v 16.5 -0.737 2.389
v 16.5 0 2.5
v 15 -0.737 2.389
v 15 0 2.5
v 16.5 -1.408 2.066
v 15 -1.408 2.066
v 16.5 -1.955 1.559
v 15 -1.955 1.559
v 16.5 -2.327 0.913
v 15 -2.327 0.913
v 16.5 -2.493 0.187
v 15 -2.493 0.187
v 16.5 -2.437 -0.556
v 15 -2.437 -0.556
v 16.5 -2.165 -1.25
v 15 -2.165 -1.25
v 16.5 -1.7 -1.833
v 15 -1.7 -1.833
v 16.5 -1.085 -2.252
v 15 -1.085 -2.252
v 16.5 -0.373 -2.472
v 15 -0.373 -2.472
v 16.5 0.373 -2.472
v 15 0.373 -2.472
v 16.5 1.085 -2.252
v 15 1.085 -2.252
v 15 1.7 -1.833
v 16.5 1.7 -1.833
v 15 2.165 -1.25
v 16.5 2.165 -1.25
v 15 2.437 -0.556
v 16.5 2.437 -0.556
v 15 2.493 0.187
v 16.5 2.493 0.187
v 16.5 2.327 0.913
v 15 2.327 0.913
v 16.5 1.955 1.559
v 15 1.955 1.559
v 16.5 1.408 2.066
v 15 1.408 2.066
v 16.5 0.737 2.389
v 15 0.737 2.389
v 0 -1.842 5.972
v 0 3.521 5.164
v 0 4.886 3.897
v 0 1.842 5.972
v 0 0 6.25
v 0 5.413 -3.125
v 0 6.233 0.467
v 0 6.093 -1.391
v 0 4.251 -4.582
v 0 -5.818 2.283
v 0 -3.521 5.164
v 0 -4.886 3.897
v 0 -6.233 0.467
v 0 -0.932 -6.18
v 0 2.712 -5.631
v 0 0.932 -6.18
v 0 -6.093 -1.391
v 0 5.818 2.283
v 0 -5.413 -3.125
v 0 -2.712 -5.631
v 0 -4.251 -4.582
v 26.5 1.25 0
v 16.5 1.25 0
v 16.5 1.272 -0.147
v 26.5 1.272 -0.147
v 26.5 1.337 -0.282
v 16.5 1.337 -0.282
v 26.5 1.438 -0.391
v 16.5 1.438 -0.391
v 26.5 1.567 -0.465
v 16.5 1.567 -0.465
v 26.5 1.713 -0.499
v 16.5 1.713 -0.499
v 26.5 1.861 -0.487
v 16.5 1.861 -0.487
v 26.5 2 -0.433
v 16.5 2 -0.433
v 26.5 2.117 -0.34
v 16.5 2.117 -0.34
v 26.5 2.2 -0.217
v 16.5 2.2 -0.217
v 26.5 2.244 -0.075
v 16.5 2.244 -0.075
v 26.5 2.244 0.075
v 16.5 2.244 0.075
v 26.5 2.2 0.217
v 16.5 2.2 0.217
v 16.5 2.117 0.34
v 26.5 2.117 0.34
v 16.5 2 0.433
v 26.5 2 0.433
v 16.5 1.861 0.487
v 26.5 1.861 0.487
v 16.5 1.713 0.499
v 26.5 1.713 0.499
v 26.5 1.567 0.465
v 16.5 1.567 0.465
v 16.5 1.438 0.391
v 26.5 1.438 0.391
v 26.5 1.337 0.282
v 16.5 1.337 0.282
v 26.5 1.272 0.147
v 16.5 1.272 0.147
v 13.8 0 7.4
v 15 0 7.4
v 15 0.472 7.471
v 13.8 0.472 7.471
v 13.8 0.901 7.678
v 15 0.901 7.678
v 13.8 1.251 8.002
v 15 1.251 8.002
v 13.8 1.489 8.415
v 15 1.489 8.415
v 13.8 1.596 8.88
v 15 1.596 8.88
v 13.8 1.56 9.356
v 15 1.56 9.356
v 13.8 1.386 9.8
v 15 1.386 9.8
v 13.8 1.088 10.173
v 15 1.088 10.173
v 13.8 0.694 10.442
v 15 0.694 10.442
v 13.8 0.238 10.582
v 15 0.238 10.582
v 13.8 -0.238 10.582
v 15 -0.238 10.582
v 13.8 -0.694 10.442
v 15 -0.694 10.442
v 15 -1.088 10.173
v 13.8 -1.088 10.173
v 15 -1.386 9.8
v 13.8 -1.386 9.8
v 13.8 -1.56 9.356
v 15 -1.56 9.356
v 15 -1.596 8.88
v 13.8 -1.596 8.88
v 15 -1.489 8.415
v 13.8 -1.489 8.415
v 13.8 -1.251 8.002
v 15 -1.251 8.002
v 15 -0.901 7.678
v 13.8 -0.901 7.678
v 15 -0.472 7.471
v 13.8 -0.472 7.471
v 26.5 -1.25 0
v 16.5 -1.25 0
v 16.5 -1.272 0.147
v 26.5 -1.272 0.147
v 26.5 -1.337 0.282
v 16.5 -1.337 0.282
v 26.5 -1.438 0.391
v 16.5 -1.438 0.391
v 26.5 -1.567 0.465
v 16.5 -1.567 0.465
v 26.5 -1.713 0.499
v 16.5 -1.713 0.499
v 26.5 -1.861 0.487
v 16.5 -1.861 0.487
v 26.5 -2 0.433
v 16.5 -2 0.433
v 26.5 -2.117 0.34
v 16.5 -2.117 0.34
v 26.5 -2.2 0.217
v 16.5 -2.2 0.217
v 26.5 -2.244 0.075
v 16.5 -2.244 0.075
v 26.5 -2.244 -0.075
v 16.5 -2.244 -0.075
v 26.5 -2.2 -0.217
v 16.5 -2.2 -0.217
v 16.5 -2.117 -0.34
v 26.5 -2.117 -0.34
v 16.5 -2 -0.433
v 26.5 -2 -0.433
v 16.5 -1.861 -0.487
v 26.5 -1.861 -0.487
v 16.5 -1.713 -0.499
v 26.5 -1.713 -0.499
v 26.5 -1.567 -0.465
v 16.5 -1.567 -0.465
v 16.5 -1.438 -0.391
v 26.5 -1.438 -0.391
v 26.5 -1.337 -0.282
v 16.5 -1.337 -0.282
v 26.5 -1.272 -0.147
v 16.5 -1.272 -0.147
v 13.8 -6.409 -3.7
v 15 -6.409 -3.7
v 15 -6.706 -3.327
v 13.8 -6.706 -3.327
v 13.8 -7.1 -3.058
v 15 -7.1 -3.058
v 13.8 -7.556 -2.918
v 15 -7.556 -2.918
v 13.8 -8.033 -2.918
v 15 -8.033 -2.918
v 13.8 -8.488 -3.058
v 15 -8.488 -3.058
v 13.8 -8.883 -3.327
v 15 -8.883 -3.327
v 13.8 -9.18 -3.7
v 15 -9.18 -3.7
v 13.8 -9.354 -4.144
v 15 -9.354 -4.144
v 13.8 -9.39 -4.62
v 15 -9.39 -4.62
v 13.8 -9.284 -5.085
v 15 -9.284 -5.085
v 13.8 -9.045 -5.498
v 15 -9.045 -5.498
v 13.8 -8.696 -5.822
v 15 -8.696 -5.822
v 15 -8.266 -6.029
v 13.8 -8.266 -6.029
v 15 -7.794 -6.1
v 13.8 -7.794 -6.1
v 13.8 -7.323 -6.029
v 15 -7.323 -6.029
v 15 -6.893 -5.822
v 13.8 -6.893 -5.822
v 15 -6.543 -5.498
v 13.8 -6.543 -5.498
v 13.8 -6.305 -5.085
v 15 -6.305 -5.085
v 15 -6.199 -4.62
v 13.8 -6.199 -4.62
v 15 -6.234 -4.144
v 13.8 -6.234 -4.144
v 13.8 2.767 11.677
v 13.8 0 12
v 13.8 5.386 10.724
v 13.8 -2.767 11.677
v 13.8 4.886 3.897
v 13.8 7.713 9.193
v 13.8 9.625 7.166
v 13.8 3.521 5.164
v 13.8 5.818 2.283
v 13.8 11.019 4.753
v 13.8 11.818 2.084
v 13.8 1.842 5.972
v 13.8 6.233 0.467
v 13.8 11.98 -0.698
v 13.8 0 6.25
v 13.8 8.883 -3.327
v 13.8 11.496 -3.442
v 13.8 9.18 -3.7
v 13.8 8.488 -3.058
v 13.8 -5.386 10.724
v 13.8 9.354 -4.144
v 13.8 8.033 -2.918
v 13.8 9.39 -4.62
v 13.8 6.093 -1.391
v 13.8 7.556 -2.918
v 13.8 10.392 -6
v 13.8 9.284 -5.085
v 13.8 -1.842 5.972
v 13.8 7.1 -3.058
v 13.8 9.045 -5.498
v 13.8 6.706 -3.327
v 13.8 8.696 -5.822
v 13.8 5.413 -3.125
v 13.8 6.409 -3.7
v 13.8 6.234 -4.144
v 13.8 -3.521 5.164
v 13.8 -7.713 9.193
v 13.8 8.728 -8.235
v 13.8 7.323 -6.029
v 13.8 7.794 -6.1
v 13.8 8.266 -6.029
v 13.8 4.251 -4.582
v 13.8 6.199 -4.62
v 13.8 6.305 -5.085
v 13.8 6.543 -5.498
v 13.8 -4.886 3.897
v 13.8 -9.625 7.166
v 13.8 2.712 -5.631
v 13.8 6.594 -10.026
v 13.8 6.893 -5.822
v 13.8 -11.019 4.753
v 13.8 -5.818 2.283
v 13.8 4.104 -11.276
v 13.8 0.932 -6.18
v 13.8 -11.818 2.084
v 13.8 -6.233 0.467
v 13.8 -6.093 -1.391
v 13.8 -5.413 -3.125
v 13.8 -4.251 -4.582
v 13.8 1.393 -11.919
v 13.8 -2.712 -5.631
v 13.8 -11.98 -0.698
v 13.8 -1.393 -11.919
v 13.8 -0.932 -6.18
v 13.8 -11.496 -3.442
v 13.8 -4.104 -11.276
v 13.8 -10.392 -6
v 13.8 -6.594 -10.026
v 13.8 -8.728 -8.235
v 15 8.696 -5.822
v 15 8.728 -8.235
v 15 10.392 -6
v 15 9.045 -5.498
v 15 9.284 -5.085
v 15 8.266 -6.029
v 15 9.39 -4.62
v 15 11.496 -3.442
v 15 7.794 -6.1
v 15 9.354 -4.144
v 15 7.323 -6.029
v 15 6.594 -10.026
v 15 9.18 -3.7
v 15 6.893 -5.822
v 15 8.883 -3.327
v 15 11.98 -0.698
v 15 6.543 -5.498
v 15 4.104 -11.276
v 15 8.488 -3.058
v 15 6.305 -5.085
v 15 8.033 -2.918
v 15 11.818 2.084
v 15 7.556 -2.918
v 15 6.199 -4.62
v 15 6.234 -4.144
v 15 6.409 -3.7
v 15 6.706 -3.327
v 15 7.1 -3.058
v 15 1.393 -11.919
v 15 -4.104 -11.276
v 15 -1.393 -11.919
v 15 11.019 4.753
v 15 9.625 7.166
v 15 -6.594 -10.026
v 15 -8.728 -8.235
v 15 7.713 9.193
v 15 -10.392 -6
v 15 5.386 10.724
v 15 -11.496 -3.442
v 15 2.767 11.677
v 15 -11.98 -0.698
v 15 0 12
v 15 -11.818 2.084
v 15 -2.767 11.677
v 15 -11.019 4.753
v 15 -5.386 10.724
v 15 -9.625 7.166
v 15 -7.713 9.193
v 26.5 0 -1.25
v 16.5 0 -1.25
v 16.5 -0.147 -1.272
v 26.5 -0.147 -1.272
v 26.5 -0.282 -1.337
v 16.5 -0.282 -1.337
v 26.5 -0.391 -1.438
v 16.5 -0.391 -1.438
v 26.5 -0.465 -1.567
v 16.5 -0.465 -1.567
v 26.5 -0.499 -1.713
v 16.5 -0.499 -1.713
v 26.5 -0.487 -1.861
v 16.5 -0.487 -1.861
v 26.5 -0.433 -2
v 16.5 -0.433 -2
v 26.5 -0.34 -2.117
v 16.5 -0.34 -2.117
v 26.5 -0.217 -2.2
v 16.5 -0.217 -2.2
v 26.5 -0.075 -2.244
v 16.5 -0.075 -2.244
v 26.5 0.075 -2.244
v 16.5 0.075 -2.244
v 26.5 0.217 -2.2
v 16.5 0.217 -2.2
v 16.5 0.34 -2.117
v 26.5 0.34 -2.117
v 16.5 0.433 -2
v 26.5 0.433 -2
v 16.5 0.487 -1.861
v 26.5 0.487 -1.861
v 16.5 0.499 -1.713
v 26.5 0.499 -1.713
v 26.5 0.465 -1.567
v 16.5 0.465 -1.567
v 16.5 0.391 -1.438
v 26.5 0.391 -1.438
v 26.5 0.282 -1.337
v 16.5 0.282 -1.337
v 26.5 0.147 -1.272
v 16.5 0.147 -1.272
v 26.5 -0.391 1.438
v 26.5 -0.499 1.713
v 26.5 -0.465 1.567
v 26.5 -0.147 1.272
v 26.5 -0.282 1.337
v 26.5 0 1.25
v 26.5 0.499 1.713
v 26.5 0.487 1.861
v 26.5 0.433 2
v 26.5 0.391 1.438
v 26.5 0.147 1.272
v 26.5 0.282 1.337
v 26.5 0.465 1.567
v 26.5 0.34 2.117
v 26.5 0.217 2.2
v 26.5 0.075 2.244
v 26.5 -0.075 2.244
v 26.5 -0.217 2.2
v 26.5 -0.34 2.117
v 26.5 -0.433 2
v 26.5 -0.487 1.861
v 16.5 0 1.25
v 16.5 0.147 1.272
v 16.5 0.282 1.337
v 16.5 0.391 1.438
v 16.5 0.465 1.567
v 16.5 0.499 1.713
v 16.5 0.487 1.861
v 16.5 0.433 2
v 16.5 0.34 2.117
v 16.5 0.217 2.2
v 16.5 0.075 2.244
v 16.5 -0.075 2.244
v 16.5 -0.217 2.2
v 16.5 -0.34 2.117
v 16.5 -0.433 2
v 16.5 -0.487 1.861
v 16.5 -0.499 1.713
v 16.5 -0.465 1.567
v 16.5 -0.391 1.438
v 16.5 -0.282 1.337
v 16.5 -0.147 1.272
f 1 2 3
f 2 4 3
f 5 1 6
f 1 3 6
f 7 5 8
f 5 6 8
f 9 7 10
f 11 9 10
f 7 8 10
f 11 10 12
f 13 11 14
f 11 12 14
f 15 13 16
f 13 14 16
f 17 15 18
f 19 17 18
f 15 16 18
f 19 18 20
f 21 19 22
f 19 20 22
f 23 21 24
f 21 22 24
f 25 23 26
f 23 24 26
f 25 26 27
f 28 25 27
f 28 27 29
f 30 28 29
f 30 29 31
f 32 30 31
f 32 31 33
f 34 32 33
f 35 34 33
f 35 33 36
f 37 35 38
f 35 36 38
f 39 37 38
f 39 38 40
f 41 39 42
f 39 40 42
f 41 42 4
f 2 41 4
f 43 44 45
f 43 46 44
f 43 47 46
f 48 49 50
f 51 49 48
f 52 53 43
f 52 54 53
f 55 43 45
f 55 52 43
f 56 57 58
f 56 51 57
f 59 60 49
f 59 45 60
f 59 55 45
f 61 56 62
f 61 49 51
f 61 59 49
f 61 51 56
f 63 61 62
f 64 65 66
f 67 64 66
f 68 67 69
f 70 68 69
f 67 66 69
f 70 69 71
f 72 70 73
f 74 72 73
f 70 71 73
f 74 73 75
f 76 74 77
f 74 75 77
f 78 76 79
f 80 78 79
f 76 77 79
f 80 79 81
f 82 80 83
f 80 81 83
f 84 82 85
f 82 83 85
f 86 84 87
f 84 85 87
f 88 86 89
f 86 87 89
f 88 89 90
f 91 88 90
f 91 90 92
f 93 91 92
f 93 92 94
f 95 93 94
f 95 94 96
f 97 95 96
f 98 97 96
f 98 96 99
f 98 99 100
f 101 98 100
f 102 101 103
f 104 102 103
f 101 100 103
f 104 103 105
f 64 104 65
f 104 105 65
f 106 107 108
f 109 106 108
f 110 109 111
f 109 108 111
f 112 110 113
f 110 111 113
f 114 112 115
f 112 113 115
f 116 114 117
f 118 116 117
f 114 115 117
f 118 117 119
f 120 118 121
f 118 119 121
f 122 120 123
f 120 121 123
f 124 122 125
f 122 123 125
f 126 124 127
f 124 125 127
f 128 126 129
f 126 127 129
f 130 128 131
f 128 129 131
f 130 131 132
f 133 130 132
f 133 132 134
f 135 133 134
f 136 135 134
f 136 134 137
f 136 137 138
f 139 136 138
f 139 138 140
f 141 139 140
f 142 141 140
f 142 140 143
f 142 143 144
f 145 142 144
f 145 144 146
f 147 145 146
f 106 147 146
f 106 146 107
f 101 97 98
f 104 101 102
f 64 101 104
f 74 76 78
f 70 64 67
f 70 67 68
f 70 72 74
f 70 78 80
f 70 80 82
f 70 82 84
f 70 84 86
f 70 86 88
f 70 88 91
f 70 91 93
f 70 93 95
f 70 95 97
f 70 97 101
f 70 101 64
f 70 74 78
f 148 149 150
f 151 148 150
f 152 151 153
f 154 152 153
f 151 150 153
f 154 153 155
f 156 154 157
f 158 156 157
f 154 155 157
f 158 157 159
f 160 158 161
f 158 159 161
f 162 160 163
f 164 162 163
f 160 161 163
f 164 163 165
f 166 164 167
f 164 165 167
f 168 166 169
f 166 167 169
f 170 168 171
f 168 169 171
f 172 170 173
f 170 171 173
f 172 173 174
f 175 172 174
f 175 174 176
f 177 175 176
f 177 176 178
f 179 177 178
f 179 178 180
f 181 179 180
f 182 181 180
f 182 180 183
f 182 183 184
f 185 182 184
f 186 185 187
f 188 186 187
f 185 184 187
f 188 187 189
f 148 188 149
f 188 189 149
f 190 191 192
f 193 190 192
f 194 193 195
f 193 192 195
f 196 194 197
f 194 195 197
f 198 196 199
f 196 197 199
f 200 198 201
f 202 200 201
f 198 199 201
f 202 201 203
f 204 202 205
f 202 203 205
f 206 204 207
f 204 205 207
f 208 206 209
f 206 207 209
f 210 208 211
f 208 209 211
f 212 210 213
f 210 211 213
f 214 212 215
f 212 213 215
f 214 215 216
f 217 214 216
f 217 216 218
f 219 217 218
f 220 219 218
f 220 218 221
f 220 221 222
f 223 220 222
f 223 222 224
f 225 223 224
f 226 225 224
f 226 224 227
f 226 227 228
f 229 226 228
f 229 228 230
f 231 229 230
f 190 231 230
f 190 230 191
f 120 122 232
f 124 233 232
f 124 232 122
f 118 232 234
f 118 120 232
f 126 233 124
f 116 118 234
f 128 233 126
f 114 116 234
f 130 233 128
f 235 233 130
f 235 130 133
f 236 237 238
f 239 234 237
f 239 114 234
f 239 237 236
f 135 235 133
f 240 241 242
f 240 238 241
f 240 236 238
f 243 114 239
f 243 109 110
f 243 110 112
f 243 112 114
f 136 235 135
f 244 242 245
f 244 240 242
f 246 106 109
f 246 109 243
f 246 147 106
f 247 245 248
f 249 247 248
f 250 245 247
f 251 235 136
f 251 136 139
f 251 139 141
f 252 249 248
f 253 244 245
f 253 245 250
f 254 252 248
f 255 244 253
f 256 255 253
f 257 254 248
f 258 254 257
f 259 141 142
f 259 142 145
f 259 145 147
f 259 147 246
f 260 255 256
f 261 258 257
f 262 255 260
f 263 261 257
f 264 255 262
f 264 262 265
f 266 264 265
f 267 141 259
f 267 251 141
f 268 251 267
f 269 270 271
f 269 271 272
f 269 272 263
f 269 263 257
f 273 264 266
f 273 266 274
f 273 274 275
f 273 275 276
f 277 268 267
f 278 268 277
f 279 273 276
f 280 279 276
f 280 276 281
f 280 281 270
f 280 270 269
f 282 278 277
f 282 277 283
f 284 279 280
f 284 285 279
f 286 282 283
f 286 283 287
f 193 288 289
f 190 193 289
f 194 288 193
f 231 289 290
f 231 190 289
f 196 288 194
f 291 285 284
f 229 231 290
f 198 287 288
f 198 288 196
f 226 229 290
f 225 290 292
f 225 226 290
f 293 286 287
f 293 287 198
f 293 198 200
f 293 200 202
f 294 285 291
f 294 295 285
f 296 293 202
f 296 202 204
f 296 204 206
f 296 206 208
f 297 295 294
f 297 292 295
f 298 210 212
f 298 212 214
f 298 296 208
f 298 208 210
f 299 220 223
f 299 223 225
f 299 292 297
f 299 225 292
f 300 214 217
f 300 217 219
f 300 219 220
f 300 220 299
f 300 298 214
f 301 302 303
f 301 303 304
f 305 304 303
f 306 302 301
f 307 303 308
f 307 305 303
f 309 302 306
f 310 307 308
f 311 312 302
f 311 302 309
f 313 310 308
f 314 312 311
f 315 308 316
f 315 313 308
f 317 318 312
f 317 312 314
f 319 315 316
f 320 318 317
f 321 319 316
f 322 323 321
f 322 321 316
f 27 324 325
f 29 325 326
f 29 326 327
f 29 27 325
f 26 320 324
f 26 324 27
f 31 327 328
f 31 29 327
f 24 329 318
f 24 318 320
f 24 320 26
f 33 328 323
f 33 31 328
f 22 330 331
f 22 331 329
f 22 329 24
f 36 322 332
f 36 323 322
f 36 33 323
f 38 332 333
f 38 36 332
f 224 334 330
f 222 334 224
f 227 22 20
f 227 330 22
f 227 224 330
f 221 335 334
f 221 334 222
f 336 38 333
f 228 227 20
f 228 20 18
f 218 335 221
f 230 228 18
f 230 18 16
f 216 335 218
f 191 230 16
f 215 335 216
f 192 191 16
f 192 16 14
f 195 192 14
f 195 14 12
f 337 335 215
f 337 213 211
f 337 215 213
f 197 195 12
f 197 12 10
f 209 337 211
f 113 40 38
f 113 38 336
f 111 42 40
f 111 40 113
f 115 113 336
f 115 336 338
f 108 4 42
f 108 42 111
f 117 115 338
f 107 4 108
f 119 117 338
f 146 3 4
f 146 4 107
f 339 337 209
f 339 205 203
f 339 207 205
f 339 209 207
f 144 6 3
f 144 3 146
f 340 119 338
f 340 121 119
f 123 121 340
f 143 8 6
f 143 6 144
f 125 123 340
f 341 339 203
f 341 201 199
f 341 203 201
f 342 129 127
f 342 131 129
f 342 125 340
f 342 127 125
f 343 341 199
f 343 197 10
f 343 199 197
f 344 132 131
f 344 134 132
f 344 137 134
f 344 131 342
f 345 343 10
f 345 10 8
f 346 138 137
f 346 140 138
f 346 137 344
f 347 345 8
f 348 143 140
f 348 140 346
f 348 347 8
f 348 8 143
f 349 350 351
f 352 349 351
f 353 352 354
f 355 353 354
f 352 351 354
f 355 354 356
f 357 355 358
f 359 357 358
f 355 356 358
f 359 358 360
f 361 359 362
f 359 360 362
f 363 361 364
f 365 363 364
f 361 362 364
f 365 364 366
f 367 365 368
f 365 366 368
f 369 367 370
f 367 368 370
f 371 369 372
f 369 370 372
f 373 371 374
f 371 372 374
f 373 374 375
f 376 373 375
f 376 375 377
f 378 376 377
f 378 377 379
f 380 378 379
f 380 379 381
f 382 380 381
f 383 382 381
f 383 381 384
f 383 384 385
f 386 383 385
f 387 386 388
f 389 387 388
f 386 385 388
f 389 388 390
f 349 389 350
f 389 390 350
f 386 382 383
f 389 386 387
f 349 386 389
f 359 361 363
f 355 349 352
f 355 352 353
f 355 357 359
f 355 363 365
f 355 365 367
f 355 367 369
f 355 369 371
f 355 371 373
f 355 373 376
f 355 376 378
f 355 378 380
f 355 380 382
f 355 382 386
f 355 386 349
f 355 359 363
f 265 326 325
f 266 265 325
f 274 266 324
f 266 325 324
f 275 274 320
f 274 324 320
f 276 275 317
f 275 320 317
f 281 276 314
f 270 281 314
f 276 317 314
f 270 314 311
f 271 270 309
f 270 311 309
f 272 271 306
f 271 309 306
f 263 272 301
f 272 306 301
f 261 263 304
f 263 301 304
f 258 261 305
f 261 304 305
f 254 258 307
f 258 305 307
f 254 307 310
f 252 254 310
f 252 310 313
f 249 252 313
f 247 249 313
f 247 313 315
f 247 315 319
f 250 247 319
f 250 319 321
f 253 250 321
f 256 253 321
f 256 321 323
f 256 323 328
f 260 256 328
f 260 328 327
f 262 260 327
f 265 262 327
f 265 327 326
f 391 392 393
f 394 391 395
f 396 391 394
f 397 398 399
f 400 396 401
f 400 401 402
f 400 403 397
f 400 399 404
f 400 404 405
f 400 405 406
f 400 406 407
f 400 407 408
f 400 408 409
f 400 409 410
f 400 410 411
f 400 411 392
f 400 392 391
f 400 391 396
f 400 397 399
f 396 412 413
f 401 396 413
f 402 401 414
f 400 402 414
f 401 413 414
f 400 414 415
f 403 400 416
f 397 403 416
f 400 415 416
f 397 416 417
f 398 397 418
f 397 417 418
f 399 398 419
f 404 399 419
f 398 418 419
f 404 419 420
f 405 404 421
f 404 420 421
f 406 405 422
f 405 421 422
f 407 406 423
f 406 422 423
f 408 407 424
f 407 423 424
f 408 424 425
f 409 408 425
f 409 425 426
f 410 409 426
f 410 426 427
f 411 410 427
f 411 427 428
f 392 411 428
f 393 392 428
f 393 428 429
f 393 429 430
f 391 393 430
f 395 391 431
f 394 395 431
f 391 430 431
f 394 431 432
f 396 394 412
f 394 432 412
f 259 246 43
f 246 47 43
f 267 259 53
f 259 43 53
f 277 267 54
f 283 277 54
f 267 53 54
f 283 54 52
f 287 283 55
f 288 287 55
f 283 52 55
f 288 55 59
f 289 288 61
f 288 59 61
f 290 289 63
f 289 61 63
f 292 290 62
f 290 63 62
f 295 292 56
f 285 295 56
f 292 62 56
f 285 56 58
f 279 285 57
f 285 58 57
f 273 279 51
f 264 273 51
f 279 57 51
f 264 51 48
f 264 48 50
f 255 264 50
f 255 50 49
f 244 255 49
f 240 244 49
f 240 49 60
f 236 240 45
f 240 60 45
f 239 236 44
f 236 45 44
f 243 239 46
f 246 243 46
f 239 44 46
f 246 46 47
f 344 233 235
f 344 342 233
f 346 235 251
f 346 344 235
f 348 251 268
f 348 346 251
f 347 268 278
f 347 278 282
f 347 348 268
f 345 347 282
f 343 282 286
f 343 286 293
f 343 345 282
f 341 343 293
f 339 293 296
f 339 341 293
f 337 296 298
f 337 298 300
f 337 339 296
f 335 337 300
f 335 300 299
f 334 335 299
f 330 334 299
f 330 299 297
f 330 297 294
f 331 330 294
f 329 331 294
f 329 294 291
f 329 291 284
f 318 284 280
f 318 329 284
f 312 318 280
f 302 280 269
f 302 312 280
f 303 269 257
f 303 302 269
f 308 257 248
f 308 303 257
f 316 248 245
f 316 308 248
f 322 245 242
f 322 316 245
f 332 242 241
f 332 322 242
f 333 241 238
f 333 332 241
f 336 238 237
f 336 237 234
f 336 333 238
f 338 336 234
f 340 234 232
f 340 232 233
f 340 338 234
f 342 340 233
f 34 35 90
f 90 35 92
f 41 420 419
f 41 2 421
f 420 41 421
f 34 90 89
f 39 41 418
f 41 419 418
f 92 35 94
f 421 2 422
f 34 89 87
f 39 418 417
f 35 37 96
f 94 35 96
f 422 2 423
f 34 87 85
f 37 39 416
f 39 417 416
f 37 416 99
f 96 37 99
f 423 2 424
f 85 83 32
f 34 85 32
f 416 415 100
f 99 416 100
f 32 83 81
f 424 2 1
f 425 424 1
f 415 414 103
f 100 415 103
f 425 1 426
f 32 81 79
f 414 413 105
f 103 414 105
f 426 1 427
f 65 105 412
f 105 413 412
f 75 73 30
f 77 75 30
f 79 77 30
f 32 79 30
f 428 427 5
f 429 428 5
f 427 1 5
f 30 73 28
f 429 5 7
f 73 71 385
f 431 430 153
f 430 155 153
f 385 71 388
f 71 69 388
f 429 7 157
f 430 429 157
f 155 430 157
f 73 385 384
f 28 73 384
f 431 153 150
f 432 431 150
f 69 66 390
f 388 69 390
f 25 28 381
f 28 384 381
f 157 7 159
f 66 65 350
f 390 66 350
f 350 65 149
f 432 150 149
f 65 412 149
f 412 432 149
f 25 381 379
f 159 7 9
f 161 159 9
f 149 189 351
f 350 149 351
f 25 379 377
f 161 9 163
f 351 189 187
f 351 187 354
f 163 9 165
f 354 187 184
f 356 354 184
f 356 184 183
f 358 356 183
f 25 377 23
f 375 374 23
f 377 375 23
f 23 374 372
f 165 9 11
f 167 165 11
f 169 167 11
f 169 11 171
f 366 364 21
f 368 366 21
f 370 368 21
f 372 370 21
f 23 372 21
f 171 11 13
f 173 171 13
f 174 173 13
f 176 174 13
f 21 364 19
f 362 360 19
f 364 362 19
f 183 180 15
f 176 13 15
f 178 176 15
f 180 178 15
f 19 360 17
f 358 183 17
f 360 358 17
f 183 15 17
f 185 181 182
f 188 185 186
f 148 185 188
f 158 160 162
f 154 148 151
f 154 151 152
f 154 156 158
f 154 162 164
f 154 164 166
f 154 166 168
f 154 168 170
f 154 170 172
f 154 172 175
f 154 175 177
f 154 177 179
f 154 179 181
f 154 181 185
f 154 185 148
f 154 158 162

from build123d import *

# Parameters (mm, degrees)
CROQUIS1_W              = 13.8
CROQUIS1_H              = 6.25
CROQUIS1_W_2            = 1.5
CROQUIS1_H_2            = 2.5
CROQUIS2_R              = 1.6
CORTAR_EXTRUIR1_DEPTH   = 3.2
MATRIZC1_COUNT          = 3
CROQUIS3_R              = 0.5
SALIENTE_EXTRUIR1_DEPTH = 10
MATRIZC2_COUNT          = 4


with BuildPart() as part:
    # Croquis1 → Revolución1 (revolve)
    with BuildSketch(Plane(origin=(0, 0, 0), x_dir=(-1, 0, 0), z_dir=(0, 1, 0))):
        with Locations((-6.9, 3.125)):
            Rectangle(CROQUIS1_W, CROQUIS1_H)
        Polygon((-15, 0), (-13.8, 0), (-13.8, 6.25), (-13.8, 12), (-15, 12), (-15, 2.5), align=None)
        with Locations((-15.75, 1.25)):
            Rectangle(CROQUIS1_W_2, CROQUIS1_H_2)
    revolve(axis=Axis((0, 0, 0), (1, 0, 0)))

    # Croquis2 → Cortar-Extruir1 (cut)
    with BuildSketch(Plane.YZ.offset(15)):
        with Locations(Location((0, 9, 0), (0, 0, 270))):
            Circle(CROQUIS2_R)
    cortar_extruir1 = extrude(amount=-CORTAR_EXTRUIR1_DEPTH, mode=Mode.SUBTRACT)

    # MatrizC1: Cortar-Extruir1 ×3 about axis
    matrizc1_axis = Axis((0, 0, 0), (1, 0, 0))
    for i in range(1, MATRIZC1_COUNT):
        add(cortar_extruir1.rotate(matrizc1_axis, i * 360 / MATRIZC1_COUNT), mode=Mode.SUBTRACT)

    # Croquis3 → Saliente-Extruir1 (add)
    with BuildSketch(Plane.YZ.offset(16.5)):
        with Locations(Location((0, 1.75, 0), (0, 0, 270))):
            Circle(CROQUIS3_R)
    saliente_extruir1 = extrude(amount=SALIENTE_EXTRUIR1_DEPTH)

    # MatrizC2: Saliente-Extruir1 ×4 about axis
    matrizc2_axis = Axis((0, 0, 0), (1, 0, 0))
    for i in range(1, MATRIZC2_COUNT):
        add(saliente_extruir1.rotate(matrizc2_axis, i * 360 / MATRIZC2_COUNT))


solid = part.part
